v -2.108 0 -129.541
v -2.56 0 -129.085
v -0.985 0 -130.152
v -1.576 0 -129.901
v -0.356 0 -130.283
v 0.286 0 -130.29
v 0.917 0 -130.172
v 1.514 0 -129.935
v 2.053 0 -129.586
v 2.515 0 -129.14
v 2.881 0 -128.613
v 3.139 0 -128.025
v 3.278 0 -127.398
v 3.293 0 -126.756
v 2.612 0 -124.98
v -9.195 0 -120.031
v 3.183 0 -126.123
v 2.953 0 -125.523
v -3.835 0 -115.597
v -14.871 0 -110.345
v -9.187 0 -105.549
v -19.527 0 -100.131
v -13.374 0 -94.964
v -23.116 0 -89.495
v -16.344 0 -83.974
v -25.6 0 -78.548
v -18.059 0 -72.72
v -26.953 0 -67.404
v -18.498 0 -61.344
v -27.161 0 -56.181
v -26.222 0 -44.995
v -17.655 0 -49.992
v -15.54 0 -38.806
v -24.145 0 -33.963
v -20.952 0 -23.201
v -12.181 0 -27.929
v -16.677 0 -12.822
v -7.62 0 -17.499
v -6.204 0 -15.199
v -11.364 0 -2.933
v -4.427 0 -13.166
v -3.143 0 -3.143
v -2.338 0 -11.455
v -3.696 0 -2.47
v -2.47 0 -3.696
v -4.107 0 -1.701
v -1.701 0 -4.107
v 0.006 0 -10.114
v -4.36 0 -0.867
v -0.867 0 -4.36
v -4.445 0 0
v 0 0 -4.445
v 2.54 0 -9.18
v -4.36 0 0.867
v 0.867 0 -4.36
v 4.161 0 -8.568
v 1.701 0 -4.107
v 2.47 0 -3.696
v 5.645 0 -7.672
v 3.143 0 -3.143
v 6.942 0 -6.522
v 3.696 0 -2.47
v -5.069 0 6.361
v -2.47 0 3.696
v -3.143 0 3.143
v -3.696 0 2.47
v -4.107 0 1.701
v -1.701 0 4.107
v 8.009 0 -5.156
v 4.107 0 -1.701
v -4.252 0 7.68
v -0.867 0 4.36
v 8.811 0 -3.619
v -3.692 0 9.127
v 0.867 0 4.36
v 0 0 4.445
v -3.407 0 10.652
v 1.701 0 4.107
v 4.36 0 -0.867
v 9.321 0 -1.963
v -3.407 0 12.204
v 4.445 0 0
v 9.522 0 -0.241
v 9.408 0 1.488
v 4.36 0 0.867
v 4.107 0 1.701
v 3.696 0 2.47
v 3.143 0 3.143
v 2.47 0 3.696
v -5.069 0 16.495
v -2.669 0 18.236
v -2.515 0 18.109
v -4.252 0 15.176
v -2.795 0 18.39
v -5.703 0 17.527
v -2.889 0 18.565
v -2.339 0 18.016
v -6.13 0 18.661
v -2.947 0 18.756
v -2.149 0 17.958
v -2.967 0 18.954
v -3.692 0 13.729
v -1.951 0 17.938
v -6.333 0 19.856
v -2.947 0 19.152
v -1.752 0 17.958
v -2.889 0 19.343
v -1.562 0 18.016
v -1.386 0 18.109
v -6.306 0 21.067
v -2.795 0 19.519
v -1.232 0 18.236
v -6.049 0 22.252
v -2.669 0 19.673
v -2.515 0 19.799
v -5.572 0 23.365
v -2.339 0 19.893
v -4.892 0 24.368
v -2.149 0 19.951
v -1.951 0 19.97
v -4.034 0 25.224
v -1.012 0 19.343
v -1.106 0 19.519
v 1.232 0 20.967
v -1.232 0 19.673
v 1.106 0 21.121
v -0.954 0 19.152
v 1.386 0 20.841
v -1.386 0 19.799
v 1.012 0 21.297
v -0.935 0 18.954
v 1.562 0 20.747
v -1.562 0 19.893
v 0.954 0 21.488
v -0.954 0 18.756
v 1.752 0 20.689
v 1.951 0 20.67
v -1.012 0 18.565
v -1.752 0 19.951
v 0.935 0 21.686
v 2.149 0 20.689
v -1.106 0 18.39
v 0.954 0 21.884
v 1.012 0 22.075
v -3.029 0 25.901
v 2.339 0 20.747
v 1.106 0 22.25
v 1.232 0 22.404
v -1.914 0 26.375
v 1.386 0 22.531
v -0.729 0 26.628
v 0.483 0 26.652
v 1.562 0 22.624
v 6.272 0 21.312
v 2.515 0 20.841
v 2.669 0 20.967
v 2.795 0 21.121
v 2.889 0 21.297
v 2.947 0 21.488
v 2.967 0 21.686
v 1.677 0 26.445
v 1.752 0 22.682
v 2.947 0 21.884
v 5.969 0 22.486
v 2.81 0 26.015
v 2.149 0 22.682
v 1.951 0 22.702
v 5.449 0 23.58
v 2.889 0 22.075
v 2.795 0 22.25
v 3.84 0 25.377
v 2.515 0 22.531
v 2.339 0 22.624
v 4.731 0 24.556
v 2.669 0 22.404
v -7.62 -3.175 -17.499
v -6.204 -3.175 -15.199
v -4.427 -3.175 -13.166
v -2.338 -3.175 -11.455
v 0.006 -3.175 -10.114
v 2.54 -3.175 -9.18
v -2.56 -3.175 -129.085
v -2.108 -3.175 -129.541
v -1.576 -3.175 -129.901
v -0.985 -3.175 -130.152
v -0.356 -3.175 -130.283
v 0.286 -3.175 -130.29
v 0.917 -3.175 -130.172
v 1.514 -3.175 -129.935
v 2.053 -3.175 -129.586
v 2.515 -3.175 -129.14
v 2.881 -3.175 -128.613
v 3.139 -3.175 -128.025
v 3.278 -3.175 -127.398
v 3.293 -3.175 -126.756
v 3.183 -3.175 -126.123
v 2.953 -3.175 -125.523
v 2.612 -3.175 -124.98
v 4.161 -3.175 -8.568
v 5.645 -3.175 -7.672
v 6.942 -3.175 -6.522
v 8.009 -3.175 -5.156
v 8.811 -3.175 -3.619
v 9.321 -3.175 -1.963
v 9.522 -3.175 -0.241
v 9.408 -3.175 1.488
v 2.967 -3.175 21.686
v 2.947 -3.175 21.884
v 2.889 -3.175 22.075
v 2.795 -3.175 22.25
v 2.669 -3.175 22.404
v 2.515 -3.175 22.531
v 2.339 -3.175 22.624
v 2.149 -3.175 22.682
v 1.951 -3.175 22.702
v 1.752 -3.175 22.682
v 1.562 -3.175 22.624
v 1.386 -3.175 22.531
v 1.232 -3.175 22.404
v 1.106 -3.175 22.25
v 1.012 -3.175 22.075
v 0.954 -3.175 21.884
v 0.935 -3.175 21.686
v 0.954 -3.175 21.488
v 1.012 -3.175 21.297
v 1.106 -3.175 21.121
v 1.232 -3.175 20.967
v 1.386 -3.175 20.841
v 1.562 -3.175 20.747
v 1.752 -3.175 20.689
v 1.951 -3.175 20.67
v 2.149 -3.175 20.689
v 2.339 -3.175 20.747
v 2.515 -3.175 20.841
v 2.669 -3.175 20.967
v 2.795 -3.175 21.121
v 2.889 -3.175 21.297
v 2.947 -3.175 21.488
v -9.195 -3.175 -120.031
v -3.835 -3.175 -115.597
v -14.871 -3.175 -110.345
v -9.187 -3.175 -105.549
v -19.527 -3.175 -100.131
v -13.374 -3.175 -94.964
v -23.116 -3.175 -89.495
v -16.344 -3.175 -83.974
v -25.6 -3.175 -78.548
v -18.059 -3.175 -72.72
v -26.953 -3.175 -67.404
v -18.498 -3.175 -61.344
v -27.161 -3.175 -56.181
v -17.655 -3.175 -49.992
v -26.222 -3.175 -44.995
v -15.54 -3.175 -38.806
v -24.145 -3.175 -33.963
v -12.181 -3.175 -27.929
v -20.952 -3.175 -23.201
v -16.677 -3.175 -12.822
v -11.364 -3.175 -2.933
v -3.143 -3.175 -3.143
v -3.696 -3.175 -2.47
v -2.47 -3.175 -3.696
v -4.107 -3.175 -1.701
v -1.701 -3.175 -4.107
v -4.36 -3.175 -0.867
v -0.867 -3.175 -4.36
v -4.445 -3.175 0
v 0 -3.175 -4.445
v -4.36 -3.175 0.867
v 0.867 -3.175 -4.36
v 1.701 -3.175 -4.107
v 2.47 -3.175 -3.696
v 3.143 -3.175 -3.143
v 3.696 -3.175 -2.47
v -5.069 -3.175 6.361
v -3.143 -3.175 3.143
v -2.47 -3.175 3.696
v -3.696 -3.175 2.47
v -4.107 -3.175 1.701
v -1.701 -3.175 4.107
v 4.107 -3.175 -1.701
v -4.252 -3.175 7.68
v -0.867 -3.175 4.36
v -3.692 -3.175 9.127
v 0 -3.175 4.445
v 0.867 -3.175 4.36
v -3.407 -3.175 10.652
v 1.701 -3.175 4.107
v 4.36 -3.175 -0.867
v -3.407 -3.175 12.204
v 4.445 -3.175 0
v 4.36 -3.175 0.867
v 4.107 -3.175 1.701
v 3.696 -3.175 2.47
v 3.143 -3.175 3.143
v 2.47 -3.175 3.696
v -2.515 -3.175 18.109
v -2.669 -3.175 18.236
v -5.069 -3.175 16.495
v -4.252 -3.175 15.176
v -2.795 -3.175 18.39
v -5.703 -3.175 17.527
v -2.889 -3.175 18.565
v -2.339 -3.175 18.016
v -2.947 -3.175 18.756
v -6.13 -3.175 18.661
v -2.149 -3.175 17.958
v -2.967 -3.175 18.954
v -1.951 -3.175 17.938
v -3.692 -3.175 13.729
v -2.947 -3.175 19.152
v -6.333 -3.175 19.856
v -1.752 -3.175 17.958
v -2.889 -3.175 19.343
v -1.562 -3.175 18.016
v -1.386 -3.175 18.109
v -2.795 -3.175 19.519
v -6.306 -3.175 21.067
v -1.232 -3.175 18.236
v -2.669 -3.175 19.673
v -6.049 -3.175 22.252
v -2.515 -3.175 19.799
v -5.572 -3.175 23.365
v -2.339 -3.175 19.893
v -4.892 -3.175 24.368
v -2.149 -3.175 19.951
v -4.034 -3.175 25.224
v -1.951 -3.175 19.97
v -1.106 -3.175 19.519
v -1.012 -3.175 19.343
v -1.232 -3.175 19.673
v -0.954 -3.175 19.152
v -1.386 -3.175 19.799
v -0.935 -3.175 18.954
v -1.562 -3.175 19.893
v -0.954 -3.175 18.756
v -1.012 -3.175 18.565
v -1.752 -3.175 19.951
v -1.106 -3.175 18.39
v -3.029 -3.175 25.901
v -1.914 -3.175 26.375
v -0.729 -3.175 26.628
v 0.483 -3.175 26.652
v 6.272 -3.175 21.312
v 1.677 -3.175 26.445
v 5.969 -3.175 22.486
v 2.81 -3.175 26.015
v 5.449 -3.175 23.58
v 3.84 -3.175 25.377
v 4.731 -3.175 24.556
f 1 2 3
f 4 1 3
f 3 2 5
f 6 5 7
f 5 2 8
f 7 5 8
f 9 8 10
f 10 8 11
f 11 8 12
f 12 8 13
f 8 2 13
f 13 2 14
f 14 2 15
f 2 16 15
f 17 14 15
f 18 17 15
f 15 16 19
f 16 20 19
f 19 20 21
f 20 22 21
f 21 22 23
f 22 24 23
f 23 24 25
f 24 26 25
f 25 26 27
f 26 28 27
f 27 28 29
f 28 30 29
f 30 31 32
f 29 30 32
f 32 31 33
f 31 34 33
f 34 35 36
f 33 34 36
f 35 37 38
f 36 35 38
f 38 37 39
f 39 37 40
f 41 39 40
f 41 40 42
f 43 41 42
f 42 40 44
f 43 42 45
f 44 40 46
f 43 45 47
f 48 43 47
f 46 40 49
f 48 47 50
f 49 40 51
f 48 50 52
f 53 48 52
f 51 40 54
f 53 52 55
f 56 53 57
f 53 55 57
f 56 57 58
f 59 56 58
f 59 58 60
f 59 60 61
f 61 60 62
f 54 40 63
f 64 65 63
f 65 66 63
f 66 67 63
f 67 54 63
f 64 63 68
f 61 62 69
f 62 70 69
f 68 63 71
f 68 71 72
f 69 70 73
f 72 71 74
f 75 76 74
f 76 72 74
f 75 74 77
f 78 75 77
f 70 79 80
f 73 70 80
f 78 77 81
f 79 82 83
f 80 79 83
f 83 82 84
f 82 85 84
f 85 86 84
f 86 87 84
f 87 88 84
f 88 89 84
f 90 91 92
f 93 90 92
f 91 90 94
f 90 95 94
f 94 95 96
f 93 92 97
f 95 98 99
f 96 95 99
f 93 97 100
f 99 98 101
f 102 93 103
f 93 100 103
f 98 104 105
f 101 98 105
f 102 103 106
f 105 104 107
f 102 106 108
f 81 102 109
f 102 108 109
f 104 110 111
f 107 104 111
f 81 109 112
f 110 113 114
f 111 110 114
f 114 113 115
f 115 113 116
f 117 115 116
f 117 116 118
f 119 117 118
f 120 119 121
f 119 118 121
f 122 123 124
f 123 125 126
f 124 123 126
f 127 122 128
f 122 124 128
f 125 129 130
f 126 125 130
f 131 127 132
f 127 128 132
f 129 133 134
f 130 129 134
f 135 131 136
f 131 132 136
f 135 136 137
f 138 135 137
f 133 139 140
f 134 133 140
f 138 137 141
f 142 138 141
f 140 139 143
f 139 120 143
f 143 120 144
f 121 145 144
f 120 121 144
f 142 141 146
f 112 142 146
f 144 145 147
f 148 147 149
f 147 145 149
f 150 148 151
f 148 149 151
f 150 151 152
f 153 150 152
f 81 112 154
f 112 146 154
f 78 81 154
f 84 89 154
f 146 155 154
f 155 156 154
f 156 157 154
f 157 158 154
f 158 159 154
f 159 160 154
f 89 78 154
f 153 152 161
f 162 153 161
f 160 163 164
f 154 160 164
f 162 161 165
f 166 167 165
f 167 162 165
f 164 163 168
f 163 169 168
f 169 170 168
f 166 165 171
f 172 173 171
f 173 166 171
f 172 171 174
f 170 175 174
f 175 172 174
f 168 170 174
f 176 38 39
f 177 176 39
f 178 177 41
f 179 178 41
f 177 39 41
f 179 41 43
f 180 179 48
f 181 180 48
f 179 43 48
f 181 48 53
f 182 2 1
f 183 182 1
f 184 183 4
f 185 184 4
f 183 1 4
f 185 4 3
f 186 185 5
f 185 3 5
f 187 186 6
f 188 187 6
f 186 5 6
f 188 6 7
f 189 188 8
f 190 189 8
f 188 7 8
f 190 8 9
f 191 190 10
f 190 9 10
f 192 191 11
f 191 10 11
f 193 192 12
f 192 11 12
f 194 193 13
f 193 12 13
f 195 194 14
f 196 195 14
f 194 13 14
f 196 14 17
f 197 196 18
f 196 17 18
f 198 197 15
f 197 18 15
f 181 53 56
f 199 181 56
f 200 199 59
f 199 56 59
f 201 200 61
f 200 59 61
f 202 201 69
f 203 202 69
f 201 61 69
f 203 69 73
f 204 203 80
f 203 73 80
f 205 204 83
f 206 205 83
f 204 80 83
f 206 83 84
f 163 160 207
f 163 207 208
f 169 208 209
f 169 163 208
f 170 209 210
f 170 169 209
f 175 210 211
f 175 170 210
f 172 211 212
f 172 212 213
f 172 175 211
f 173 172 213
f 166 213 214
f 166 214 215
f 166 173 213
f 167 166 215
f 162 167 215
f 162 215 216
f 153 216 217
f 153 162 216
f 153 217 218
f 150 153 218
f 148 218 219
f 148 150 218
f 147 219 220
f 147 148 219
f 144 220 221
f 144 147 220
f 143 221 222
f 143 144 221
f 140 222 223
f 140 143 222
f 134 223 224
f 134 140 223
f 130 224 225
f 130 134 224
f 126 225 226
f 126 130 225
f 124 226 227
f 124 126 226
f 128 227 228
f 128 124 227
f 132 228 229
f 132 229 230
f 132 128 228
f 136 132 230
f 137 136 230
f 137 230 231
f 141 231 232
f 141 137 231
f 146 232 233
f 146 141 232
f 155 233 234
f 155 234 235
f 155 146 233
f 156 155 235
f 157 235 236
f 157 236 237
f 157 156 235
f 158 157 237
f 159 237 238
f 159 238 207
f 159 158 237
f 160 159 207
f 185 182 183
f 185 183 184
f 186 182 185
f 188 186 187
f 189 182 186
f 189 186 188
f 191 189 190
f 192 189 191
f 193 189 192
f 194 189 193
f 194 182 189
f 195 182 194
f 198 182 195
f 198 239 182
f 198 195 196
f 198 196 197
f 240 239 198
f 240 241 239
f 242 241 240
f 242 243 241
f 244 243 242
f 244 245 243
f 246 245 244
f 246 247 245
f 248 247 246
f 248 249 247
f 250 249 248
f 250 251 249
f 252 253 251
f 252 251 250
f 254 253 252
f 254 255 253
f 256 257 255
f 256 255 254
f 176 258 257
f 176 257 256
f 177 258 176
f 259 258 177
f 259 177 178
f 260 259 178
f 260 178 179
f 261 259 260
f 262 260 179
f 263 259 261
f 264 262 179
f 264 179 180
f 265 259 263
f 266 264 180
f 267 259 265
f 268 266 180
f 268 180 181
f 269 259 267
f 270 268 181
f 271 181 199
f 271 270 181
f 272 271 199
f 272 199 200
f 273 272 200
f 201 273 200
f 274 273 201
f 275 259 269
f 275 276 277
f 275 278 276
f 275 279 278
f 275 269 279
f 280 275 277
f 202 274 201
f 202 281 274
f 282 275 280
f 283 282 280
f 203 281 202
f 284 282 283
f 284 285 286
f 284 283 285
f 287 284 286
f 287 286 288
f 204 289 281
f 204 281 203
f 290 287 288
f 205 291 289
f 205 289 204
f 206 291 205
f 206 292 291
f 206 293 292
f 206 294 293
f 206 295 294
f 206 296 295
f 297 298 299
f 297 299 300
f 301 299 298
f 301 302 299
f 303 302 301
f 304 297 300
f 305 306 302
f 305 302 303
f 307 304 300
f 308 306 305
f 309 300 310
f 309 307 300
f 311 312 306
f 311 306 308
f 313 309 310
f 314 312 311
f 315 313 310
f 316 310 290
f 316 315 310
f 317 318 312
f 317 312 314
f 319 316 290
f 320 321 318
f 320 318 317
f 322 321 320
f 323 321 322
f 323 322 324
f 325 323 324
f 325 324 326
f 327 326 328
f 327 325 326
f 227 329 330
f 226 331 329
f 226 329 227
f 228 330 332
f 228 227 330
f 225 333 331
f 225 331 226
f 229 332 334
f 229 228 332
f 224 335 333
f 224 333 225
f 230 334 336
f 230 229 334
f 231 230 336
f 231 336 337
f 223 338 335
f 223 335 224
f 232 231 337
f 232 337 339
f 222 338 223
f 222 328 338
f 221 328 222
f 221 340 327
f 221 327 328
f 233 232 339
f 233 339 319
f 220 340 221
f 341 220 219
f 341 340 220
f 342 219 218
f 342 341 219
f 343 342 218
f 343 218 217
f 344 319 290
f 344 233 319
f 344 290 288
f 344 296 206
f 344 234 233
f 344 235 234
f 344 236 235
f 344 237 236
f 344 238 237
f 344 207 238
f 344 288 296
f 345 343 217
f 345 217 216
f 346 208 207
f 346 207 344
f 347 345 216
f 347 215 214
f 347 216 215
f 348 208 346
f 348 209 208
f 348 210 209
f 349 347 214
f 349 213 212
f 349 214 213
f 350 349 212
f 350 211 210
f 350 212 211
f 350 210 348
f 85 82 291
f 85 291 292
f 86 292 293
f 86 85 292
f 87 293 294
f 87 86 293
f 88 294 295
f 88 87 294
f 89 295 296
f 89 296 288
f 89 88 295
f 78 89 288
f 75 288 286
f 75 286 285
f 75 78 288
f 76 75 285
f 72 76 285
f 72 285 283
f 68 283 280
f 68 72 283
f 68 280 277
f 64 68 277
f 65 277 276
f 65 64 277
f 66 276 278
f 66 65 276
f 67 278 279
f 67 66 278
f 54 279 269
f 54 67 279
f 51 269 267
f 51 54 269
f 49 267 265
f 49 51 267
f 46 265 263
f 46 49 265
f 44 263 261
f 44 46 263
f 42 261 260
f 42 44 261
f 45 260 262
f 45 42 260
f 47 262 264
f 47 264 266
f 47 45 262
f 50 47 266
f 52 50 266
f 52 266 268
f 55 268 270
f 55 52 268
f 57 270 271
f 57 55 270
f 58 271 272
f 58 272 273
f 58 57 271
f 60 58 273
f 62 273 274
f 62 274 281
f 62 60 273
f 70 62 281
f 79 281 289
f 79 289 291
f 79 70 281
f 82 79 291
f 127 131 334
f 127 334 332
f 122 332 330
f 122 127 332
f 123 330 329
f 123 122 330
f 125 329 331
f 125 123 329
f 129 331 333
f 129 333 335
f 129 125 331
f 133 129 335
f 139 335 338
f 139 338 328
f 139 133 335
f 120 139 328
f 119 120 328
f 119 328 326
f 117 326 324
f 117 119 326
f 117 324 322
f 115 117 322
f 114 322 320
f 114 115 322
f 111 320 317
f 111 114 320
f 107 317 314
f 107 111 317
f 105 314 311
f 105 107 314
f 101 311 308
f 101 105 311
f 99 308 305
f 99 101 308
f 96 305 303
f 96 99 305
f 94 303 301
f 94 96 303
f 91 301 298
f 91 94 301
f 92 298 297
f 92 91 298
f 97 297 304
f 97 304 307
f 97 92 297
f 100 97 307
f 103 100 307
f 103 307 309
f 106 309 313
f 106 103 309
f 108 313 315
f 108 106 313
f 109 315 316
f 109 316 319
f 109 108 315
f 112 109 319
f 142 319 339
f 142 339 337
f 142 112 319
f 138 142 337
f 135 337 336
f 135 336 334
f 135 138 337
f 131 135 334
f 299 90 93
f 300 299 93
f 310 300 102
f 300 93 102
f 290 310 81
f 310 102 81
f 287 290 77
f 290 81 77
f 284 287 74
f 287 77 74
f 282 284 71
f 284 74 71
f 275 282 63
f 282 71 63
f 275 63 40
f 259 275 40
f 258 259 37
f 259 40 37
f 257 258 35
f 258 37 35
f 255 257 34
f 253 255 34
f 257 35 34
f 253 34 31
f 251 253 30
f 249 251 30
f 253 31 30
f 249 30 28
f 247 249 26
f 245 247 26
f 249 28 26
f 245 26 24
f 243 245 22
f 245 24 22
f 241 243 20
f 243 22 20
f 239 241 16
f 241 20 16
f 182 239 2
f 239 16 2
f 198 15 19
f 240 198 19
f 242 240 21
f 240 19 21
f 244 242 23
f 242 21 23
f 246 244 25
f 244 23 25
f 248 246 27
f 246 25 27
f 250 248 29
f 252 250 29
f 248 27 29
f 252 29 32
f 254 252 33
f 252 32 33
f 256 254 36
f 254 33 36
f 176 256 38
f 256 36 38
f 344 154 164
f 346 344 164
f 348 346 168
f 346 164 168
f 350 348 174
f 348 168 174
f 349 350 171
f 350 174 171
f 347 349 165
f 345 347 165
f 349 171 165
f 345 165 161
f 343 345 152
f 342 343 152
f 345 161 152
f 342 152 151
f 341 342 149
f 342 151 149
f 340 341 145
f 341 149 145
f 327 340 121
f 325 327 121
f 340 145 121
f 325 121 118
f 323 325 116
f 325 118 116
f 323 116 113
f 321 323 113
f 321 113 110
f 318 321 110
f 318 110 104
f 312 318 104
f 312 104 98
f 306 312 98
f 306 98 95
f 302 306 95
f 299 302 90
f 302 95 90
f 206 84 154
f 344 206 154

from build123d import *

# Parameters (mm, degrees)
F0_R     = 4.445
F0_R_2   = 1.016
F1_DEPTH = 3.175


with BuildPart() as f1:
    # F0 (on Front) → F1 (new body)
    with BuildSketch(Plane.XZ):
        with BuildLine():
            Line((9.40801, 1.488281), (6.272006, 21.312188))
            ThreePointArc((6.272006, 21.312188), (-2.482691, 26.164548), (-5.068596, 16.494842))
            ThreePointArc((-5.068596, 16.494842), (-3.37124, 11.428014), (-5.068596, 6.361186))
            ThreePointArc((-5.068596, 6.361186), (-27.200848, -61.795162), (-2.560215, -129.085307))
            ThreePointArc((-2.560215, -129.085307), (2.052999, -129.586194), (2.611765, -124.979632))
            ThreePointArc((2.611765, -124.979632), (-18.059382, -72.719897), (-7.62, -17.498565))
            ThreePointArc((-7.62, -17.498565), (-3.418112, -12.26682), (2.54, -9.180089))
            ThreePointArc((2.54, -9.180089), (8.008886, -5.155906), (9.40801, 1.488281))
        make_face()
        Circle(F0_R, mode=Mode.SUBTRACT)
        with Locations((-1.950606, 18.954171)):
            Circle(F0_R_2, mode=Mode.SUBTRACT)
        with Locations((1.950606, 21.685829)):
            Circle(F0_R_2, mode=Mode.SUBTRACT)
    extrude(amount=F1_DEPTH)


solid = f1.part
